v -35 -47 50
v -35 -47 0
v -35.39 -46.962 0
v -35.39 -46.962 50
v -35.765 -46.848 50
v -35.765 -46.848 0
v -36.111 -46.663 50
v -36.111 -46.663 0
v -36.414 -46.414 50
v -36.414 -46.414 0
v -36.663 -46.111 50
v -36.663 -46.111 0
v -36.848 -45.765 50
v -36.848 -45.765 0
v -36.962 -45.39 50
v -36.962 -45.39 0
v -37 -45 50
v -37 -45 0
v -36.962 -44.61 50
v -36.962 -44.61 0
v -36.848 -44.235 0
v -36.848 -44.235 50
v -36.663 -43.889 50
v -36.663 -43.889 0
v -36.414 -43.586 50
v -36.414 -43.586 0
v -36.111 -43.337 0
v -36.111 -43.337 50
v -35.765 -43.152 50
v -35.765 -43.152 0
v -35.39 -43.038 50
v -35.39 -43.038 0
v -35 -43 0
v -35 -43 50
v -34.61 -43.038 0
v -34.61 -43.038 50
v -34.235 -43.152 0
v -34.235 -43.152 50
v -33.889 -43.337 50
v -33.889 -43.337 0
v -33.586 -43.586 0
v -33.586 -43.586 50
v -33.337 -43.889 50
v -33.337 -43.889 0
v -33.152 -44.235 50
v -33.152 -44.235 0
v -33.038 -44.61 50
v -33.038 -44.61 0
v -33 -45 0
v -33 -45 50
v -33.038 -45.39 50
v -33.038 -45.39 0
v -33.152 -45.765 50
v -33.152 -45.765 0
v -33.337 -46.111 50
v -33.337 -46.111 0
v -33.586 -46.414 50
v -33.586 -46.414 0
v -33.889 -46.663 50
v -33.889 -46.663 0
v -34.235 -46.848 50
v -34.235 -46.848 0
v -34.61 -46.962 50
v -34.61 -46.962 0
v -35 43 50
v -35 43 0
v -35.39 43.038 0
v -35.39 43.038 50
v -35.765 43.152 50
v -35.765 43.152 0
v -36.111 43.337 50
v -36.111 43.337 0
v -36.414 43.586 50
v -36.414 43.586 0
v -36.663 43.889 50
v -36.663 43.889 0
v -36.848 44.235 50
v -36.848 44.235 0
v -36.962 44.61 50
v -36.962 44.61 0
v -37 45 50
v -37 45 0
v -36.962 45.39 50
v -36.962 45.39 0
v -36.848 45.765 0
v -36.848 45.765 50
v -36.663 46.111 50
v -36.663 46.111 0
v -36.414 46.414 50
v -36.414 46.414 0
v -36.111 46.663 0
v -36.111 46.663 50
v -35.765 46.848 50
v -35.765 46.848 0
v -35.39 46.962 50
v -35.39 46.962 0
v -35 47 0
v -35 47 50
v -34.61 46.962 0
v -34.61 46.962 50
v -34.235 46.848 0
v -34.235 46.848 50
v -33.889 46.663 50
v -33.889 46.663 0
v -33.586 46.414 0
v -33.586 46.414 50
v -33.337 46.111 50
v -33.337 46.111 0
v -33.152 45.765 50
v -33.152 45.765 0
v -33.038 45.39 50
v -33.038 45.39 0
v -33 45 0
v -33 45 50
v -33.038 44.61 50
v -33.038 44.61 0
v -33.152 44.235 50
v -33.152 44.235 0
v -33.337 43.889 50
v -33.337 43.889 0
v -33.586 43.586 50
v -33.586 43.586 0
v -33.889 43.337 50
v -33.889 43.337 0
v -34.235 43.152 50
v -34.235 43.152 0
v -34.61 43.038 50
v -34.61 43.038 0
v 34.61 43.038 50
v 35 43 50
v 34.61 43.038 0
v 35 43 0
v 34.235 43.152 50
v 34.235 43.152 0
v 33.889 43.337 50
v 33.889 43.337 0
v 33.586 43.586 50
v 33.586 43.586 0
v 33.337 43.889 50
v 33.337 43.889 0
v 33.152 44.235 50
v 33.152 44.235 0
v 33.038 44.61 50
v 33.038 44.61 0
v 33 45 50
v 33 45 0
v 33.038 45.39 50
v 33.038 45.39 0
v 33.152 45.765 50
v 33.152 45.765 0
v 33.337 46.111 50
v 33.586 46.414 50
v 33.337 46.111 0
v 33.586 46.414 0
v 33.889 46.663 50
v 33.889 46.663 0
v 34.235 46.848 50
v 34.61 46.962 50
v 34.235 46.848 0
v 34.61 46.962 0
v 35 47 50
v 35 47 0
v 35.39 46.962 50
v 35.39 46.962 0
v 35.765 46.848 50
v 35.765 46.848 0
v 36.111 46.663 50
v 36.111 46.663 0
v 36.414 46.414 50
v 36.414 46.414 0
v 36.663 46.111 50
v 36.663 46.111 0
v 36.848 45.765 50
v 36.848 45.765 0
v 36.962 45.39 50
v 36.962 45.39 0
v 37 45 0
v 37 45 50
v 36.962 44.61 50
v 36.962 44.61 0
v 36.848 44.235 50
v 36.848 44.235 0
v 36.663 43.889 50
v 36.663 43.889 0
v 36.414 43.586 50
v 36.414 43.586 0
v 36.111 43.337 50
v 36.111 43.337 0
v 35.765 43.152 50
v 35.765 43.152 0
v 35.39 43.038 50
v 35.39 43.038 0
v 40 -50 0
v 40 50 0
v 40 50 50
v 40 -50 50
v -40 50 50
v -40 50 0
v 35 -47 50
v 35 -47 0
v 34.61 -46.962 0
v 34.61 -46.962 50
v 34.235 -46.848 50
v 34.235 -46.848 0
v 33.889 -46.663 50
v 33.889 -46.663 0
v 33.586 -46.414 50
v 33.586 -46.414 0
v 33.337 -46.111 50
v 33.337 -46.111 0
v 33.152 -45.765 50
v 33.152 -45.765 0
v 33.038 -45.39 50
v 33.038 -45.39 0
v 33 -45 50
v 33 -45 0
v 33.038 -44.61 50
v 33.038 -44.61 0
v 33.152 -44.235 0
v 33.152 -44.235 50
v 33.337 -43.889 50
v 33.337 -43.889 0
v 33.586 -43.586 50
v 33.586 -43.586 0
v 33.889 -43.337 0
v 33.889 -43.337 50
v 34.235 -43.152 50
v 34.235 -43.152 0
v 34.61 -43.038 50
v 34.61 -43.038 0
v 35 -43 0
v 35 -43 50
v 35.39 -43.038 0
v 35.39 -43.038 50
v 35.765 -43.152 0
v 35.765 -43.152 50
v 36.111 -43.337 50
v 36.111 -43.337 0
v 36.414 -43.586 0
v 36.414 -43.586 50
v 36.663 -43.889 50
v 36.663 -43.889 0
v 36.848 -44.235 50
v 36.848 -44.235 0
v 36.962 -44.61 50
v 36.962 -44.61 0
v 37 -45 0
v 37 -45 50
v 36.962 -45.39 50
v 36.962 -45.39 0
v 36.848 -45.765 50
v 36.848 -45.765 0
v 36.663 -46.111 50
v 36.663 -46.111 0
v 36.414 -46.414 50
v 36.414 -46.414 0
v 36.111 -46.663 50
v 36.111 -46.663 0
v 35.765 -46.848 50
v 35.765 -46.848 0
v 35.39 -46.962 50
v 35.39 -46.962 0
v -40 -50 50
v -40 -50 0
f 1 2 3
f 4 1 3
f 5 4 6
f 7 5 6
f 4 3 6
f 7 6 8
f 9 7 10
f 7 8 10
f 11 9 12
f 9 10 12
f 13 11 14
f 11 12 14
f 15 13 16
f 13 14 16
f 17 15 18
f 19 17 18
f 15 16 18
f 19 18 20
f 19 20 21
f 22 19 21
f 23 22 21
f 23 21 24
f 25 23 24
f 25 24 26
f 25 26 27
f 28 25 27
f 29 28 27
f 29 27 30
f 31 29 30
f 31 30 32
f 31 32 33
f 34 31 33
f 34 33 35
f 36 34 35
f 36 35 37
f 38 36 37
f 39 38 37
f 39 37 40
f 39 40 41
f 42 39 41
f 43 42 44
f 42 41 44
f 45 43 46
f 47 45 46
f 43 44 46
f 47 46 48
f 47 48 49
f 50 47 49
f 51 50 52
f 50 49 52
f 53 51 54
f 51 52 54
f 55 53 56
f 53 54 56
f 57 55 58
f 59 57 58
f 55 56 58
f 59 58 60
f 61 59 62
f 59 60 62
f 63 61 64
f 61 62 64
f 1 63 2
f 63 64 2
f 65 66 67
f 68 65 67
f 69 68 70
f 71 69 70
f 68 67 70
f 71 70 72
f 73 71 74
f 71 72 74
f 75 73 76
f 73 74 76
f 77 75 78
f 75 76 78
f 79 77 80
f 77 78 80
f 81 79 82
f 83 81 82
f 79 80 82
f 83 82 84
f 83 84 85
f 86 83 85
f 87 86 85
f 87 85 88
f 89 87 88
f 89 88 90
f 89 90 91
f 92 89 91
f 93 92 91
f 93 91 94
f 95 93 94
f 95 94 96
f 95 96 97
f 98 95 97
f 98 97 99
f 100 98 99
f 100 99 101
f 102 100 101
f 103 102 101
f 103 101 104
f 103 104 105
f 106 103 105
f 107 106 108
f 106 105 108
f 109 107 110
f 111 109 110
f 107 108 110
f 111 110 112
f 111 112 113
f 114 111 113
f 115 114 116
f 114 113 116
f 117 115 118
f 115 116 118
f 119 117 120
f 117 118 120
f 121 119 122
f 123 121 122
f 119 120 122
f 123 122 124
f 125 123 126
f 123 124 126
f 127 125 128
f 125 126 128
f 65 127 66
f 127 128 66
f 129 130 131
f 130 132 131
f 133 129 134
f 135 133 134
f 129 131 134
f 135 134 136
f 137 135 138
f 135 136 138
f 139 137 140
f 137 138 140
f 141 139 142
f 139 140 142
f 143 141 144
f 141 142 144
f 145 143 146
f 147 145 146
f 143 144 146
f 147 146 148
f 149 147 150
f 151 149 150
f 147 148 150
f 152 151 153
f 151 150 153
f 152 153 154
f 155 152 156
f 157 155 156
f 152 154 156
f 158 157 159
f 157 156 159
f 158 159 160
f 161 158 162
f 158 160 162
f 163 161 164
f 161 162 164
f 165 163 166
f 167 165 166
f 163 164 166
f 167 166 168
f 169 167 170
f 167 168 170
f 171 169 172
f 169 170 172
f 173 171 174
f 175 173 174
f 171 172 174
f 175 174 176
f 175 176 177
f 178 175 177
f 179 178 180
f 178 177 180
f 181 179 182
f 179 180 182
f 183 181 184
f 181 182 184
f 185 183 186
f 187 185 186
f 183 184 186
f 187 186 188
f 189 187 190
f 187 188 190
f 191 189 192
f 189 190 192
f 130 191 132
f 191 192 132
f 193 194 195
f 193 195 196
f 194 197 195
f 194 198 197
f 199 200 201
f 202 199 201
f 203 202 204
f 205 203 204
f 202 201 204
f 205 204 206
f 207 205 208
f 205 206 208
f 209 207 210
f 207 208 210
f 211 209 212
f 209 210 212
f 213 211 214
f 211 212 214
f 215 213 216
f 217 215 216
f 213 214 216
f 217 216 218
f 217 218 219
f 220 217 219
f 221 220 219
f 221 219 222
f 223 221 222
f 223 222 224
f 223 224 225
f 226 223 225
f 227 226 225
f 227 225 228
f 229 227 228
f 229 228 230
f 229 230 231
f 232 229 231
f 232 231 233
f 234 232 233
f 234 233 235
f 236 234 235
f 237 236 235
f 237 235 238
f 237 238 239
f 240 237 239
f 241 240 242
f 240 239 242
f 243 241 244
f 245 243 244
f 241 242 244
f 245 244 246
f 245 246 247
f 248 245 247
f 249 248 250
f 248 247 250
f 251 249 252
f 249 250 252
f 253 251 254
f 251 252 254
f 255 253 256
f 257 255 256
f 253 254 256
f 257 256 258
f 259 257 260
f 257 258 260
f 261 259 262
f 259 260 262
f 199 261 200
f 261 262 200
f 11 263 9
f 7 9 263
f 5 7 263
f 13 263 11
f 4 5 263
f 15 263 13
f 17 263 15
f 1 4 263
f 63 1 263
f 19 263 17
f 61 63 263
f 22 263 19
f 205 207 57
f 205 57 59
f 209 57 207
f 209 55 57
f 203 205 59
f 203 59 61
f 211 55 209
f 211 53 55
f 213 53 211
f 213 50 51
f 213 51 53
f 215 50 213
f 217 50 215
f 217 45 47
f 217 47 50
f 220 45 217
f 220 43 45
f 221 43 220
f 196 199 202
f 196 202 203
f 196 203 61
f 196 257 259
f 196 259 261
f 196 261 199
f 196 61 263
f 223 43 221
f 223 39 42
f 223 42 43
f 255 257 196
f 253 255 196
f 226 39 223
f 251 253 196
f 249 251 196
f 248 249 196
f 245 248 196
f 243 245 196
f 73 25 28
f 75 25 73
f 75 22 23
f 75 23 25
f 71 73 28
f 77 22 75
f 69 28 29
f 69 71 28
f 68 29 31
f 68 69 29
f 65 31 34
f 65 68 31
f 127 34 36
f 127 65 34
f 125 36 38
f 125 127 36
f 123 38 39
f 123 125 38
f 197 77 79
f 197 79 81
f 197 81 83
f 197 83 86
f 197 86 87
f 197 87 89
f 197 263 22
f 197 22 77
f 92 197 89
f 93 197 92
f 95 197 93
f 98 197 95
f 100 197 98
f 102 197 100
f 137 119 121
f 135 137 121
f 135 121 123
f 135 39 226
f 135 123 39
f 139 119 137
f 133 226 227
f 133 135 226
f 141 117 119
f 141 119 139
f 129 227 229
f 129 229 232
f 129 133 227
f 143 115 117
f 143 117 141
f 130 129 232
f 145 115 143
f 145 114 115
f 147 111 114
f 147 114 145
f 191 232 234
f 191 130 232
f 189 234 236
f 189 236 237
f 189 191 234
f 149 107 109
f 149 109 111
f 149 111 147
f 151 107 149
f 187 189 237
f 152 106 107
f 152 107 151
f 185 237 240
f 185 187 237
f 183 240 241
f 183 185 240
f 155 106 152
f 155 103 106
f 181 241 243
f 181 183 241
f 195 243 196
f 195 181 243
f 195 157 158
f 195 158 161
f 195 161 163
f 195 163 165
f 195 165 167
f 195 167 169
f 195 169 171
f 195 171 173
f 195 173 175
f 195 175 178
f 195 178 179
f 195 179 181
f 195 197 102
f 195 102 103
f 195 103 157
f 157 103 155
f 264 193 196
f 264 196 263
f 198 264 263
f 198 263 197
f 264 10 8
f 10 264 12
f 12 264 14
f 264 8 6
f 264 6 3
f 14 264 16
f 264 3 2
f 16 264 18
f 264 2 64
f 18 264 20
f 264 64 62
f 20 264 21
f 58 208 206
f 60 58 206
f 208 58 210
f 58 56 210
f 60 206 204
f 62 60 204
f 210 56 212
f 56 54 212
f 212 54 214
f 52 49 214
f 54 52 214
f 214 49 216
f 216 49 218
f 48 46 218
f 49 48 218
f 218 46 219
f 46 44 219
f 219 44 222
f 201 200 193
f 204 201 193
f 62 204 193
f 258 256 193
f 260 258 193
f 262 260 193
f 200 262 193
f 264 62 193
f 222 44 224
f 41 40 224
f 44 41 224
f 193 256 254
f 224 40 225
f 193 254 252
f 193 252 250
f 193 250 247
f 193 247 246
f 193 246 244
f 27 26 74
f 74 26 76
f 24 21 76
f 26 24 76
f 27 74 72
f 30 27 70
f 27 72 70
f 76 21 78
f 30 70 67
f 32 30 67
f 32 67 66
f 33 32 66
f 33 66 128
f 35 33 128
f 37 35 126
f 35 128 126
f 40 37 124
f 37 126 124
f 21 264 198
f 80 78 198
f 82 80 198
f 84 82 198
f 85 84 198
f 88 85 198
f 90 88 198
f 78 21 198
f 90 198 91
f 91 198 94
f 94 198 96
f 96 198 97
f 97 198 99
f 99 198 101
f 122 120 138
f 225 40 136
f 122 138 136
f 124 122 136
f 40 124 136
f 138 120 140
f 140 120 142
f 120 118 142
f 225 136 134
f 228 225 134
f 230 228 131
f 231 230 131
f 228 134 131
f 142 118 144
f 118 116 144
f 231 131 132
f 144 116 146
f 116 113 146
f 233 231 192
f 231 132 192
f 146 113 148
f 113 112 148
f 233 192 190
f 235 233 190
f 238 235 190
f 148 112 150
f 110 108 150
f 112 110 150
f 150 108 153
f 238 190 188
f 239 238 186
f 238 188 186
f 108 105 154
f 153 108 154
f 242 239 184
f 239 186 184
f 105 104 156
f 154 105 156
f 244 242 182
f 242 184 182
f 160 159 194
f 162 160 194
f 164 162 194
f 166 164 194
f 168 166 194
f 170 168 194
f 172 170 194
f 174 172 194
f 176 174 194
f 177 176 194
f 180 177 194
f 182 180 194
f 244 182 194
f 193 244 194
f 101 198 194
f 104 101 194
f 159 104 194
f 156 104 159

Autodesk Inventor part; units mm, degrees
sketch "Sketch2" plane through (0, 0, 0) normal (0, 0, 1) x (1, 0, 0)
  line L0 (40, -50) -> (-40, -50)
  line L1 (-40, -50) -> (-40, 50)
  line L2 (-40, 50) -> (40, 50)
  line L3 (40, 50) -> (40, -50)
  line L4 (40, -50) -> (-40, 50) construction
  line L5 (-40, -50) -> (40, 50) construction
  point P0 (0, 0)
  dimension "d0" = 100
  dimension "d1" = 80
extrude "Extrusion1" add sketch "Sketch2" along normal blind 50
sketch "Sketch3" plane through (0, 0, 50) normal (0, 0, 1) x (1, 0, 0)
  line L0 (40, 50) -> (-40, 50) construction
  line L1 (-40, 50) -> (-40, -50) construction
  line L2 (-40, -50) -> (40, -50) construction
  line L3 (40, -50) -> (40, 50) construction
  point P0 (0, 0)
  point P1 (-35, 45)
  point P2 (35, 45)
  point P3 (-35, -45)
  point P4 (35, -45)
  dimension "d4" = 5
  dimension "d5" = 5
  dimension "d6" = 5
  dimension "d7" = 5
  dimension "d8" = 5
  dimension "d9" = 5
  dimension "d10" = 5
  dimension "d11" = 5
hole "Hole1" at (-35, 45, 50) at (35, 45, 50) at (-35, -45, 50) at (35, -45, 50) direction (0, 0, -1) diameter 4 depth 50
properties part number "P028_PCB_surMesures"
